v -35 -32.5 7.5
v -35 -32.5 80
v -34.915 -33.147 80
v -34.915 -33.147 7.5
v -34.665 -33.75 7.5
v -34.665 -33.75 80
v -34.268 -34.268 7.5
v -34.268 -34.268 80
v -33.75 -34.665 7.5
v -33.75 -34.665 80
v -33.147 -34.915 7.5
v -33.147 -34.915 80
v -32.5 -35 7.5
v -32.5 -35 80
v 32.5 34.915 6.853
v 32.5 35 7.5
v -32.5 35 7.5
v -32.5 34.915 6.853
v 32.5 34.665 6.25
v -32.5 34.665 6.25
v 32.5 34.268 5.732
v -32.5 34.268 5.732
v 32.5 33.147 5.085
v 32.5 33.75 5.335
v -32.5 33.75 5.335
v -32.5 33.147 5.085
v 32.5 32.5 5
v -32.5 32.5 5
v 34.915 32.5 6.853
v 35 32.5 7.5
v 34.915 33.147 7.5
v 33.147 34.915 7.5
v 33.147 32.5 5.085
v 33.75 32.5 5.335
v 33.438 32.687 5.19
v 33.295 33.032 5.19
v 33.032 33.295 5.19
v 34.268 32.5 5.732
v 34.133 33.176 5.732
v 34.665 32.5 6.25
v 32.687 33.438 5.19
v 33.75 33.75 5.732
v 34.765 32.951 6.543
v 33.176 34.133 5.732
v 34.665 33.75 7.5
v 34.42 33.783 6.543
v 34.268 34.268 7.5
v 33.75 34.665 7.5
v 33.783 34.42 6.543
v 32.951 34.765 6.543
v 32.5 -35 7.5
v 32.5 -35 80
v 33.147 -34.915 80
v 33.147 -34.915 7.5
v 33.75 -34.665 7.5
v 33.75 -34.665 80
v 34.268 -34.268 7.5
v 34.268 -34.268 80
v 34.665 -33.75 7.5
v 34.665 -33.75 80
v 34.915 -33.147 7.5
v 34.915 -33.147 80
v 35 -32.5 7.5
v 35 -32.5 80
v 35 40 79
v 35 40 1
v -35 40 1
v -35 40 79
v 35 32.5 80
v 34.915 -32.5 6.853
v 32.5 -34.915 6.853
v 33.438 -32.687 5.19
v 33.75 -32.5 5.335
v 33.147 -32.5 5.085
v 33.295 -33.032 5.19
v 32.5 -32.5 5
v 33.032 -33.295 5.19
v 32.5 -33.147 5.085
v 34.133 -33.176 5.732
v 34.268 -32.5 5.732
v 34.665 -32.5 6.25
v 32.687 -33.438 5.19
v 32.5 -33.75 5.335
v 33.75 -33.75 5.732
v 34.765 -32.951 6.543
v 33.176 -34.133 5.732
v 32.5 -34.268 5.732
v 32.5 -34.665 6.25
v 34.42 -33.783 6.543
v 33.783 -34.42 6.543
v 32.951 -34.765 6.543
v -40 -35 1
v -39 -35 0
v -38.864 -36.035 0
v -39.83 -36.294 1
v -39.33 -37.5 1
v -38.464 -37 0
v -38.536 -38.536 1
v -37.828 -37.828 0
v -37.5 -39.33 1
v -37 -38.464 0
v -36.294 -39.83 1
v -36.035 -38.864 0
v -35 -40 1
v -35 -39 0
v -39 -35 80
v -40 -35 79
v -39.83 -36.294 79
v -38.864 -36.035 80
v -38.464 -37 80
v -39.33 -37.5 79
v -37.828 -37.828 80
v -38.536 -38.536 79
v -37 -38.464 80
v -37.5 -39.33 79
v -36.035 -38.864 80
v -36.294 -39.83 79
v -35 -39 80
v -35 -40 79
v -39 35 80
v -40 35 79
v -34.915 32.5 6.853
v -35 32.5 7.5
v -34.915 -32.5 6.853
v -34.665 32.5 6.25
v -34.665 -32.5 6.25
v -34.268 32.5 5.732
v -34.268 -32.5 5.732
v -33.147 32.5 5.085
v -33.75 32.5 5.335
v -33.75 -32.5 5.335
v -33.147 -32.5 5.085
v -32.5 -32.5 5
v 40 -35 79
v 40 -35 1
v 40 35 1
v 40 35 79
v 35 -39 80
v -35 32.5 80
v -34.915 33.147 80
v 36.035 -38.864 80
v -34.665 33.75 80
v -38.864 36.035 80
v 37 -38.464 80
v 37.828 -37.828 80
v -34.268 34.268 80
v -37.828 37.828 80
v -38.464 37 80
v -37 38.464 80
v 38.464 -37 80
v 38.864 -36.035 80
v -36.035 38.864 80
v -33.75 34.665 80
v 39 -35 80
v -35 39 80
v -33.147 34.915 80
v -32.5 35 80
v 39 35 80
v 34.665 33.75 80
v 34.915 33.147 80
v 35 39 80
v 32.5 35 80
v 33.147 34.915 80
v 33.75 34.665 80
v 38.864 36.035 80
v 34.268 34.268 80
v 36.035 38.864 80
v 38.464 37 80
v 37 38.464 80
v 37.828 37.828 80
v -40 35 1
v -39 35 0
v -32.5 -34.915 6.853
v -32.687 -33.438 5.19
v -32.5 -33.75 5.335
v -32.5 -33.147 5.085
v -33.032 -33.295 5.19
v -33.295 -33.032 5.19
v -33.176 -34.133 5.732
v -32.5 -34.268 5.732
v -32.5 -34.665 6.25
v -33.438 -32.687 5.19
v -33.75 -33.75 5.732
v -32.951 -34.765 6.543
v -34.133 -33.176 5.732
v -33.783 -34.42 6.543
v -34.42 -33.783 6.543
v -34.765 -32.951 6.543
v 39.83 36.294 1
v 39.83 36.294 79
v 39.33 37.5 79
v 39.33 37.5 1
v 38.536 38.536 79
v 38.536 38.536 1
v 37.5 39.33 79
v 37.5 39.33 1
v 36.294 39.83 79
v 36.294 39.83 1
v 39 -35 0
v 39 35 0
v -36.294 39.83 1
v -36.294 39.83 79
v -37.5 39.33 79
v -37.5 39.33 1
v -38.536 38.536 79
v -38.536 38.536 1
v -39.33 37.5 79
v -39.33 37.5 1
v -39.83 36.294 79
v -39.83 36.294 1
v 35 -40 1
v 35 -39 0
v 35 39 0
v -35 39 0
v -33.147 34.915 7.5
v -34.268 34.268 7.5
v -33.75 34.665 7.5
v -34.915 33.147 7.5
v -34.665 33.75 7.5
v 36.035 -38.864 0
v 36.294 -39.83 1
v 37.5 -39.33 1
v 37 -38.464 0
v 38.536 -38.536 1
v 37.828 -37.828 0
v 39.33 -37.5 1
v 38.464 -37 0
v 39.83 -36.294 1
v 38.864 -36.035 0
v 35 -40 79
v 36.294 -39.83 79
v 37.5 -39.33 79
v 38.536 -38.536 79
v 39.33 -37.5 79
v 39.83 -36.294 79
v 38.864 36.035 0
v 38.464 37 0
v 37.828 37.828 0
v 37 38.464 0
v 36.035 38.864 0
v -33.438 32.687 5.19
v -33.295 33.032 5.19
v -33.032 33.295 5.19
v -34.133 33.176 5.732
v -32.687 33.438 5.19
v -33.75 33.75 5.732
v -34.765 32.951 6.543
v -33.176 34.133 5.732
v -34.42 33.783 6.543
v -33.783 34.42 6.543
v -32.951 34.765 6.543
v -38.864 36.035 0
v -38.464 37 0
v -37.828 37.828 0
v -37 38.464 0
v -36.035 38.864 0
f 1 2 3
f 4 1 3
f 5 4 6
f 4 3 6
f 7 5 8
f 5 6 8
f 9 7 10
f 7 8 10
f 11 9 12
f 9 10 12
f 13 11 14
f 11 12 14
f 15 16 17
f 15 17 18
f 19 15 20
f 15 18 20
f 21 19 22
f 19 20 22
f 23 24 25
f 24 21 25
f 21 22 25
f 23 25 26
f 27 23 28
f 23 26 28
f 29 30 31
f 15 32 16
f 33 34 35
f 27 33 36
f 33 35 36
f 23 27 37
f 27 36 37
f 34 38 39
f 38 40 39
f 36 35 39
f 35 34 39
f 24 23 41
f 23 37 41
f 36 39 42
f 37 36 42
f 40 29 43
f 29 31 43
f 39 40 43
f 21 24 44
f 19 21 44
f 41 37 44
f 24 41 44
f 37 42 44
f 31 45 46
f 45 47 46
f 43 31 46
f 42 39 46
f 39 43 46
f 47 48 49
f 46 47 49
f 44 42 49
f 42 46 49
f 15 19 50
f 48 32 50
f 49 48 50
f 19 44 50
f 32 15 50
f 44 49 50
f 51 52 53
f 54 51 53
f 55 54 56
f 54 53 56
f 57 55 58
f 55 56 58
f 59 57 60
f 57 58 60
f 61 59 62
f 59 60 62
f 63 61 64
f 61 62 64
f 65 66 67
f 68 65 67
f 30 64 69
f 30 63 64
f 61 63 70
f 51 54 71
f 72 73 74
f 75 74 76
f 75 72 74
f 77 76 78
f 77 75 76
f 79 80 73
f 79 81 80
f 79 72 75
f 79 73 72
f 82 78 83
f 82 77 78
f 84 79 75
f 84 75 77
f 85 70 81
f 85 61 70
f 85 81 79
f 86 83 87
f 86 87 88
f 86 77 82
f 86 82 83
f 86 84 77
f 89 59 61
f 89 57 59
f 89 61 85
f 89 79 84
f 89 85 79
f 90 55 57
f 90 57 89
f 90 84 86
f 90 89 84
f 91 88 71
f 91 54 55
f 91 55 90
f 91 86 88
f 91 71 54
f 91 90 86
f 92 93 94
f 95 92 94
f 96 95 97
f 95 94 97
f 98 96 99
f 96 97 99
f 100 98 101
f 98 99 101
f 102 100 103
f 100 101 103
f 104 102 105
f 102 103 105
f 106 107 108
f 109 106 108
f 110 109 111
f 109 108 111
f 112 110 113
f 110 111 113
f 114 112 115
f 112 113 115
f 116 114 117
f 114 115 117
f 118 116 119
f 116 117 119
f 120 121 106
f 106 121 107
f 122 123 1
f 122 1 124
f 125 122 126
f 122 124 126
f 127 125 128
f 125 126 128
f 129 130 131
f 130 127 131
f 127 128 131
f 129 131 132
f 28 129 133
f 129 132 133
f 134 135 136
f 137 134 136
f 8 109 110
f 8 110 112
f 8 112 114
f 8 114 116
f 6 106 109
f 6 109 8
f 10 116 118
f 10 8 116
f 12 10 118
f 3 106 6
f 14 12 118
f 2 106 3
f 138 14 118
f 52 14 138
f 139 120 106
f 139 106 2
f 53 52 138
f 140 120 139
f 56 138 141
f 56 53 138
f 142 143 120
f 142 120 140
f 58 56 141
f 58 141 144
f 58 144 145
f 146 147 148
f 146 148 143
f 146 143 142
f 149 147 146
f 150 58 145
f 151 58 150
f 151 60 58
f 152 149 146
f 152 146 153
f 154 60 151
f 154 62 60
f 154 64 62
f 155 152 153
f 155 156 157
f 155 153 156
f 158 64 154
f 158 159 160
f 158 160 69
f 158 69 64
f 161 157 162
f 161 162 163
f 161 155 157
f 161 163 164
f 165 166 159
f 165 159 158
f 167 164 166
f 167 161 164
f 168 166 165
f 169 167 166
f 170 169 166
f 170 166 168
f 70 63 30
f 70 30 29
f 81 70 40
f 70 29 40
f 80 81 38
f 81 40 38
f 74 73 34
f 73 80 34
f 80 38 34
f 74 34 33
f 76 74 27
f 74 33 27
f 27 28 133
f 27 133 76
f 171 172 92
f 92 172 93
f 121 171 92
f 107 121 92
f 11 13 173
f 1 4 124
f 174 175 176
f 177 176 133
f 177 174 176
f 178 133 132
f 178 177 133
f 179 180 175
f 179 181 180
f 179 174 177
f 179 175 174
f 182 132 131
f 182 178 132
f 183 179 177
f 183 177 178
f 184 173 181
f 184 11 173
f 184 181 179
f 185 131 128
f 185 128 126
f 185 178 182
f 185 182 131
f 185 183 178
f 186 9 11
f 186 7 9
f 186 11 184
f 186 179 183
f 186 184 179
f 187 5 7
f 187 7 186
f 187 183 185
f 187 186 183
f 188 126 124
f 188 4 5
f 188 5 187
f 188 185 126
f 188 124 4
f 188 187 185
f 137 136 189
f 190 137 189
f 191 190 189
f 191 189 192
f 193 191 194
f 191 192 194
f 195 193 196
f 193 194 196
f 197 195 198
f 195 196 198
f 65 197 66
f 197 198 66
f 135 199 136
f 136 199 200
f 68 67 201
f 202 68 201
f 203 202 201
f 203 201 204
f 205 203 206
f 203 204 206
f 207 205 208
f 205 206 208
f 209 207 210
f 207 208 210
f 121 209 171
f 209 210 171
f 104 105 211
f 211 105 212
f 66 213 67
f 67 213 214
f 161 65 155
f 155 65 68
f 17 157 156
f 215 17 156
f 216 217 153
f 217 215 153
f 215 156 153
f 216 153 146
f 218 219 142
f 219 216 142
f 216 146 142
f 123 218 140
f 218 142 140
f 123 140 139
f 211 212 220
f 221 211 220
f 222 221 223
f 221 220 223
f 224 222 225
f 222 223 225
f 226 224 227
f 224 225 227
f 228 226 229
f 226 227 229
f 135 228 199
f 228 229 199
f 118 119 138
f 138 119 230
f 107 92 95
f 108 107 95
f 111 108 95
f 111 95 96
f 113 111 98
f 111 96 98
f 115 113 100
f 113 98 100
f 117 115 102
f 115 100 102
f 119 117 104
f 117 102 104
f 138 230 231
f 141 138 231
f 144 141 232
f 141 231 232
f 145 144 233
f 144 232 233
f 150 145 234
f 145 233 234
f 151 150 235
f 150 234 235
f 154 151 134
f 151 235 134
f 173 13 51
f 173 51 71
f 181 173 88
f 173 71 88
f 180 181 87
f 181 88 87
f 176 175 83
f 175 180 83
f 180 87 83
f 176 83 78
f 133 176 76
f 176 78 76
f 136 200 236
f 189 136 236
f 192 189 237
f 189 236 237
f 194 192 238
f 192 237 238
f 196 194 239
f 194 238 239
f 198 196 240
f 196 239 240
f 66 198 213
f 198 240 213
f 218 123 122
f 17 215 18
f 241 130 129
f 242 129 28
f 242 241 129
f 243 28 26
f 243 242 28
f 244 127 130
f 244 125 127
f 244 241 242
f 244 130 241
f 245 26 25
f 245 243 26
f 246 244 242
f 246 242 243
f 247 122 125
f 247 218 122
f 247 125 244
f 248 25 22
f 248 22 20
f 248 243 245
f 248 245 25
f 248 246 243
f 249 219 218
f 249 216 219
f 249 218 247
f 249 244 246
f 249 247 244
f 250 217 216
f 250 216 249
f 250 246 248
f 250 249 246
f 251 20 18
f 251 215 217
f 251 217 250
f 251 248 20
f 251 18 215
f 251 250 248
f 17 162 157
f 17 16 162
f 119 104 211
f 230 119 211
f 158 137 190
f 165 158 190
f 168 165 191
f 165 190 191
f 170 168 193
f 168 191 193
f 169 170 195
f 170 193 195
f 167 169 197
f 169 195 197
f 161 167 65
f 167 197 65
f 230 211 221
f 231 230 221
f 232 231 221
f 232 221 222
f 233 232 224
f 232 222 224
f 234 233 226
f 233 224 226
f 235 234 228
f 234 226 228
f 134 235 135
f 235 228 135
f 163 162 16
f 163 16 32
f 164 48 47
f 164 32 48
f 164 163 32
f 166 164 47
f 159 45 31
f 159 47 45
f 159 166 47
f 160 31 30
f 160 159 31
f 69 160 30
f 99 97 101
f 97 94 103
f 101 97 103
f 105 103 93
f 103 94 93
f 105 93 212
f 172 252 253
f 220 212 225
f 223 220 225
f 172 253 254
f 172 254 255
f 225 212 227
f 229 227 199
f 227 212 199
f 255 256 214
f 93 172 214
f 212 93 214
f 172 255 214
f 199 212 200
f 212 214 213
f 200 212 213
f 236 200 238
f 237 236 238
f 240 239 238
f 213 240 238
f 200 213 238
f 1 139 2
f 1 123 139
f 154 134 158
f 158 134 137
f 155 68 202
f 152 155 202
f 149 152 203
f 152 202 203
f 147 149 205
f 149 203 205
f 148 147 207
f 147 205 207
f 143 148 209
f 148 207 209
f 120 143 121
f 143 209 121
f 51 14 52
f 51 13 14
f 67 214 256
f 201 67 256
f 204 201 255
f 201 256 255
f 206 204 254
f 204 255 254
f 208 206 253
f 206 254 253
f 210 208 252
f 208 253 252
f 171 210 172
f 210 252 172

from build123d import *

# Parameters (mm, degrees)
F1_DEPTH = 80
F2_T     = 5
F3_R     = 2.5
F4_SIZE  = 1


# Not quite as in the source:
# - a shell that OpenCascade refuses in one call is made with other operations: the cavity is built on its own and cut out


with BuildPart() as f1:
    # F0 (on Top) → F1 (new body)
    with BuildSketch(Plane.XY):
        with BuildLine():
            Line((35, 40), (-35, 40))
            ThreePointArc((-35, 40), (-38.5355339059, 38.5355339059), (-40, 35))
            Line((-40, 35), (-40, -35))
            ThreePointArc((-40, -35), (-38.5355339059, -38.5355339059), (-35, -40))
            Line((-35, -40), (35, -40))
            ThreePointArc((35, -40), (38.5355339059, -38.5355339059), (40, -35))
            Line((40, -35), (40, 35))
            ThreePointArc((40, 35), (38.5355339059, 38.5355339059), (35, 40))
        make_face()
    extrude(amount=F1_DEPTH)

    # F2: shell of thickness 5, made by hand


with BuildPart() as f2_core1:
    # F2_t2: copy of F1
    add(f1.part)

    # the walls: a layer under each face that stays
    f2_faces = [f2_core1.faces().sort_by_distance(p)[0] for p in [
        (0, 40, 40),
        (-40, 0, 40),
        (0, -40, 40),
        (40, 0, 40),
        (0, 0, 0),
    ]]
    thicken(f2_faces, amount=-F2_T, mode=Mode.SUBTRACT)


with BuildPart() as f1_1:
    add(f1.part)

    # what is left inside the walls is the cavity
    f2_cavity = [f2_core1.part.solids().sort_by_distance(p)[0] for p in [
        (0, 34.95, 55),
    ]]
    add(f2_cavity, mode=Mode.SUBTRACT)

    # F3
    f3_edges = [f1_1.edges().sort_by_distance(p)[0] for p in [
        (35, 35, 42.5),
        (-35, 35, 42.5),
        (-35, -35, 42.5),
        (35, -35, 42.5),
        (35, 0, 5),
        (0, -35, 5),
        (-35, 0, 5),
        (0, 35, 5),
    ]]
    fillet(f3_edges, radius=F3_R)

    # F4
    f4_edges = [f1_1.edges().sort_by_distance(p)[0] for p in [
        (0, 40, 0),
        (-38.535534, 38.535534, 0),
        (-40, 0, 0),
        (-38.535534, -38.535534, 0),
        (0, -40, 0),
        (38.535534, -38.535534, 0),
        (40, 0, 0),
        (38.535534, 38.535534, 0),
        (0, 40, 80),
        (-38.535534, 38.535534, 80),
    ]]
    chamfer(f4_edges, length=F4_SIZE)


solid = f1_1.part
